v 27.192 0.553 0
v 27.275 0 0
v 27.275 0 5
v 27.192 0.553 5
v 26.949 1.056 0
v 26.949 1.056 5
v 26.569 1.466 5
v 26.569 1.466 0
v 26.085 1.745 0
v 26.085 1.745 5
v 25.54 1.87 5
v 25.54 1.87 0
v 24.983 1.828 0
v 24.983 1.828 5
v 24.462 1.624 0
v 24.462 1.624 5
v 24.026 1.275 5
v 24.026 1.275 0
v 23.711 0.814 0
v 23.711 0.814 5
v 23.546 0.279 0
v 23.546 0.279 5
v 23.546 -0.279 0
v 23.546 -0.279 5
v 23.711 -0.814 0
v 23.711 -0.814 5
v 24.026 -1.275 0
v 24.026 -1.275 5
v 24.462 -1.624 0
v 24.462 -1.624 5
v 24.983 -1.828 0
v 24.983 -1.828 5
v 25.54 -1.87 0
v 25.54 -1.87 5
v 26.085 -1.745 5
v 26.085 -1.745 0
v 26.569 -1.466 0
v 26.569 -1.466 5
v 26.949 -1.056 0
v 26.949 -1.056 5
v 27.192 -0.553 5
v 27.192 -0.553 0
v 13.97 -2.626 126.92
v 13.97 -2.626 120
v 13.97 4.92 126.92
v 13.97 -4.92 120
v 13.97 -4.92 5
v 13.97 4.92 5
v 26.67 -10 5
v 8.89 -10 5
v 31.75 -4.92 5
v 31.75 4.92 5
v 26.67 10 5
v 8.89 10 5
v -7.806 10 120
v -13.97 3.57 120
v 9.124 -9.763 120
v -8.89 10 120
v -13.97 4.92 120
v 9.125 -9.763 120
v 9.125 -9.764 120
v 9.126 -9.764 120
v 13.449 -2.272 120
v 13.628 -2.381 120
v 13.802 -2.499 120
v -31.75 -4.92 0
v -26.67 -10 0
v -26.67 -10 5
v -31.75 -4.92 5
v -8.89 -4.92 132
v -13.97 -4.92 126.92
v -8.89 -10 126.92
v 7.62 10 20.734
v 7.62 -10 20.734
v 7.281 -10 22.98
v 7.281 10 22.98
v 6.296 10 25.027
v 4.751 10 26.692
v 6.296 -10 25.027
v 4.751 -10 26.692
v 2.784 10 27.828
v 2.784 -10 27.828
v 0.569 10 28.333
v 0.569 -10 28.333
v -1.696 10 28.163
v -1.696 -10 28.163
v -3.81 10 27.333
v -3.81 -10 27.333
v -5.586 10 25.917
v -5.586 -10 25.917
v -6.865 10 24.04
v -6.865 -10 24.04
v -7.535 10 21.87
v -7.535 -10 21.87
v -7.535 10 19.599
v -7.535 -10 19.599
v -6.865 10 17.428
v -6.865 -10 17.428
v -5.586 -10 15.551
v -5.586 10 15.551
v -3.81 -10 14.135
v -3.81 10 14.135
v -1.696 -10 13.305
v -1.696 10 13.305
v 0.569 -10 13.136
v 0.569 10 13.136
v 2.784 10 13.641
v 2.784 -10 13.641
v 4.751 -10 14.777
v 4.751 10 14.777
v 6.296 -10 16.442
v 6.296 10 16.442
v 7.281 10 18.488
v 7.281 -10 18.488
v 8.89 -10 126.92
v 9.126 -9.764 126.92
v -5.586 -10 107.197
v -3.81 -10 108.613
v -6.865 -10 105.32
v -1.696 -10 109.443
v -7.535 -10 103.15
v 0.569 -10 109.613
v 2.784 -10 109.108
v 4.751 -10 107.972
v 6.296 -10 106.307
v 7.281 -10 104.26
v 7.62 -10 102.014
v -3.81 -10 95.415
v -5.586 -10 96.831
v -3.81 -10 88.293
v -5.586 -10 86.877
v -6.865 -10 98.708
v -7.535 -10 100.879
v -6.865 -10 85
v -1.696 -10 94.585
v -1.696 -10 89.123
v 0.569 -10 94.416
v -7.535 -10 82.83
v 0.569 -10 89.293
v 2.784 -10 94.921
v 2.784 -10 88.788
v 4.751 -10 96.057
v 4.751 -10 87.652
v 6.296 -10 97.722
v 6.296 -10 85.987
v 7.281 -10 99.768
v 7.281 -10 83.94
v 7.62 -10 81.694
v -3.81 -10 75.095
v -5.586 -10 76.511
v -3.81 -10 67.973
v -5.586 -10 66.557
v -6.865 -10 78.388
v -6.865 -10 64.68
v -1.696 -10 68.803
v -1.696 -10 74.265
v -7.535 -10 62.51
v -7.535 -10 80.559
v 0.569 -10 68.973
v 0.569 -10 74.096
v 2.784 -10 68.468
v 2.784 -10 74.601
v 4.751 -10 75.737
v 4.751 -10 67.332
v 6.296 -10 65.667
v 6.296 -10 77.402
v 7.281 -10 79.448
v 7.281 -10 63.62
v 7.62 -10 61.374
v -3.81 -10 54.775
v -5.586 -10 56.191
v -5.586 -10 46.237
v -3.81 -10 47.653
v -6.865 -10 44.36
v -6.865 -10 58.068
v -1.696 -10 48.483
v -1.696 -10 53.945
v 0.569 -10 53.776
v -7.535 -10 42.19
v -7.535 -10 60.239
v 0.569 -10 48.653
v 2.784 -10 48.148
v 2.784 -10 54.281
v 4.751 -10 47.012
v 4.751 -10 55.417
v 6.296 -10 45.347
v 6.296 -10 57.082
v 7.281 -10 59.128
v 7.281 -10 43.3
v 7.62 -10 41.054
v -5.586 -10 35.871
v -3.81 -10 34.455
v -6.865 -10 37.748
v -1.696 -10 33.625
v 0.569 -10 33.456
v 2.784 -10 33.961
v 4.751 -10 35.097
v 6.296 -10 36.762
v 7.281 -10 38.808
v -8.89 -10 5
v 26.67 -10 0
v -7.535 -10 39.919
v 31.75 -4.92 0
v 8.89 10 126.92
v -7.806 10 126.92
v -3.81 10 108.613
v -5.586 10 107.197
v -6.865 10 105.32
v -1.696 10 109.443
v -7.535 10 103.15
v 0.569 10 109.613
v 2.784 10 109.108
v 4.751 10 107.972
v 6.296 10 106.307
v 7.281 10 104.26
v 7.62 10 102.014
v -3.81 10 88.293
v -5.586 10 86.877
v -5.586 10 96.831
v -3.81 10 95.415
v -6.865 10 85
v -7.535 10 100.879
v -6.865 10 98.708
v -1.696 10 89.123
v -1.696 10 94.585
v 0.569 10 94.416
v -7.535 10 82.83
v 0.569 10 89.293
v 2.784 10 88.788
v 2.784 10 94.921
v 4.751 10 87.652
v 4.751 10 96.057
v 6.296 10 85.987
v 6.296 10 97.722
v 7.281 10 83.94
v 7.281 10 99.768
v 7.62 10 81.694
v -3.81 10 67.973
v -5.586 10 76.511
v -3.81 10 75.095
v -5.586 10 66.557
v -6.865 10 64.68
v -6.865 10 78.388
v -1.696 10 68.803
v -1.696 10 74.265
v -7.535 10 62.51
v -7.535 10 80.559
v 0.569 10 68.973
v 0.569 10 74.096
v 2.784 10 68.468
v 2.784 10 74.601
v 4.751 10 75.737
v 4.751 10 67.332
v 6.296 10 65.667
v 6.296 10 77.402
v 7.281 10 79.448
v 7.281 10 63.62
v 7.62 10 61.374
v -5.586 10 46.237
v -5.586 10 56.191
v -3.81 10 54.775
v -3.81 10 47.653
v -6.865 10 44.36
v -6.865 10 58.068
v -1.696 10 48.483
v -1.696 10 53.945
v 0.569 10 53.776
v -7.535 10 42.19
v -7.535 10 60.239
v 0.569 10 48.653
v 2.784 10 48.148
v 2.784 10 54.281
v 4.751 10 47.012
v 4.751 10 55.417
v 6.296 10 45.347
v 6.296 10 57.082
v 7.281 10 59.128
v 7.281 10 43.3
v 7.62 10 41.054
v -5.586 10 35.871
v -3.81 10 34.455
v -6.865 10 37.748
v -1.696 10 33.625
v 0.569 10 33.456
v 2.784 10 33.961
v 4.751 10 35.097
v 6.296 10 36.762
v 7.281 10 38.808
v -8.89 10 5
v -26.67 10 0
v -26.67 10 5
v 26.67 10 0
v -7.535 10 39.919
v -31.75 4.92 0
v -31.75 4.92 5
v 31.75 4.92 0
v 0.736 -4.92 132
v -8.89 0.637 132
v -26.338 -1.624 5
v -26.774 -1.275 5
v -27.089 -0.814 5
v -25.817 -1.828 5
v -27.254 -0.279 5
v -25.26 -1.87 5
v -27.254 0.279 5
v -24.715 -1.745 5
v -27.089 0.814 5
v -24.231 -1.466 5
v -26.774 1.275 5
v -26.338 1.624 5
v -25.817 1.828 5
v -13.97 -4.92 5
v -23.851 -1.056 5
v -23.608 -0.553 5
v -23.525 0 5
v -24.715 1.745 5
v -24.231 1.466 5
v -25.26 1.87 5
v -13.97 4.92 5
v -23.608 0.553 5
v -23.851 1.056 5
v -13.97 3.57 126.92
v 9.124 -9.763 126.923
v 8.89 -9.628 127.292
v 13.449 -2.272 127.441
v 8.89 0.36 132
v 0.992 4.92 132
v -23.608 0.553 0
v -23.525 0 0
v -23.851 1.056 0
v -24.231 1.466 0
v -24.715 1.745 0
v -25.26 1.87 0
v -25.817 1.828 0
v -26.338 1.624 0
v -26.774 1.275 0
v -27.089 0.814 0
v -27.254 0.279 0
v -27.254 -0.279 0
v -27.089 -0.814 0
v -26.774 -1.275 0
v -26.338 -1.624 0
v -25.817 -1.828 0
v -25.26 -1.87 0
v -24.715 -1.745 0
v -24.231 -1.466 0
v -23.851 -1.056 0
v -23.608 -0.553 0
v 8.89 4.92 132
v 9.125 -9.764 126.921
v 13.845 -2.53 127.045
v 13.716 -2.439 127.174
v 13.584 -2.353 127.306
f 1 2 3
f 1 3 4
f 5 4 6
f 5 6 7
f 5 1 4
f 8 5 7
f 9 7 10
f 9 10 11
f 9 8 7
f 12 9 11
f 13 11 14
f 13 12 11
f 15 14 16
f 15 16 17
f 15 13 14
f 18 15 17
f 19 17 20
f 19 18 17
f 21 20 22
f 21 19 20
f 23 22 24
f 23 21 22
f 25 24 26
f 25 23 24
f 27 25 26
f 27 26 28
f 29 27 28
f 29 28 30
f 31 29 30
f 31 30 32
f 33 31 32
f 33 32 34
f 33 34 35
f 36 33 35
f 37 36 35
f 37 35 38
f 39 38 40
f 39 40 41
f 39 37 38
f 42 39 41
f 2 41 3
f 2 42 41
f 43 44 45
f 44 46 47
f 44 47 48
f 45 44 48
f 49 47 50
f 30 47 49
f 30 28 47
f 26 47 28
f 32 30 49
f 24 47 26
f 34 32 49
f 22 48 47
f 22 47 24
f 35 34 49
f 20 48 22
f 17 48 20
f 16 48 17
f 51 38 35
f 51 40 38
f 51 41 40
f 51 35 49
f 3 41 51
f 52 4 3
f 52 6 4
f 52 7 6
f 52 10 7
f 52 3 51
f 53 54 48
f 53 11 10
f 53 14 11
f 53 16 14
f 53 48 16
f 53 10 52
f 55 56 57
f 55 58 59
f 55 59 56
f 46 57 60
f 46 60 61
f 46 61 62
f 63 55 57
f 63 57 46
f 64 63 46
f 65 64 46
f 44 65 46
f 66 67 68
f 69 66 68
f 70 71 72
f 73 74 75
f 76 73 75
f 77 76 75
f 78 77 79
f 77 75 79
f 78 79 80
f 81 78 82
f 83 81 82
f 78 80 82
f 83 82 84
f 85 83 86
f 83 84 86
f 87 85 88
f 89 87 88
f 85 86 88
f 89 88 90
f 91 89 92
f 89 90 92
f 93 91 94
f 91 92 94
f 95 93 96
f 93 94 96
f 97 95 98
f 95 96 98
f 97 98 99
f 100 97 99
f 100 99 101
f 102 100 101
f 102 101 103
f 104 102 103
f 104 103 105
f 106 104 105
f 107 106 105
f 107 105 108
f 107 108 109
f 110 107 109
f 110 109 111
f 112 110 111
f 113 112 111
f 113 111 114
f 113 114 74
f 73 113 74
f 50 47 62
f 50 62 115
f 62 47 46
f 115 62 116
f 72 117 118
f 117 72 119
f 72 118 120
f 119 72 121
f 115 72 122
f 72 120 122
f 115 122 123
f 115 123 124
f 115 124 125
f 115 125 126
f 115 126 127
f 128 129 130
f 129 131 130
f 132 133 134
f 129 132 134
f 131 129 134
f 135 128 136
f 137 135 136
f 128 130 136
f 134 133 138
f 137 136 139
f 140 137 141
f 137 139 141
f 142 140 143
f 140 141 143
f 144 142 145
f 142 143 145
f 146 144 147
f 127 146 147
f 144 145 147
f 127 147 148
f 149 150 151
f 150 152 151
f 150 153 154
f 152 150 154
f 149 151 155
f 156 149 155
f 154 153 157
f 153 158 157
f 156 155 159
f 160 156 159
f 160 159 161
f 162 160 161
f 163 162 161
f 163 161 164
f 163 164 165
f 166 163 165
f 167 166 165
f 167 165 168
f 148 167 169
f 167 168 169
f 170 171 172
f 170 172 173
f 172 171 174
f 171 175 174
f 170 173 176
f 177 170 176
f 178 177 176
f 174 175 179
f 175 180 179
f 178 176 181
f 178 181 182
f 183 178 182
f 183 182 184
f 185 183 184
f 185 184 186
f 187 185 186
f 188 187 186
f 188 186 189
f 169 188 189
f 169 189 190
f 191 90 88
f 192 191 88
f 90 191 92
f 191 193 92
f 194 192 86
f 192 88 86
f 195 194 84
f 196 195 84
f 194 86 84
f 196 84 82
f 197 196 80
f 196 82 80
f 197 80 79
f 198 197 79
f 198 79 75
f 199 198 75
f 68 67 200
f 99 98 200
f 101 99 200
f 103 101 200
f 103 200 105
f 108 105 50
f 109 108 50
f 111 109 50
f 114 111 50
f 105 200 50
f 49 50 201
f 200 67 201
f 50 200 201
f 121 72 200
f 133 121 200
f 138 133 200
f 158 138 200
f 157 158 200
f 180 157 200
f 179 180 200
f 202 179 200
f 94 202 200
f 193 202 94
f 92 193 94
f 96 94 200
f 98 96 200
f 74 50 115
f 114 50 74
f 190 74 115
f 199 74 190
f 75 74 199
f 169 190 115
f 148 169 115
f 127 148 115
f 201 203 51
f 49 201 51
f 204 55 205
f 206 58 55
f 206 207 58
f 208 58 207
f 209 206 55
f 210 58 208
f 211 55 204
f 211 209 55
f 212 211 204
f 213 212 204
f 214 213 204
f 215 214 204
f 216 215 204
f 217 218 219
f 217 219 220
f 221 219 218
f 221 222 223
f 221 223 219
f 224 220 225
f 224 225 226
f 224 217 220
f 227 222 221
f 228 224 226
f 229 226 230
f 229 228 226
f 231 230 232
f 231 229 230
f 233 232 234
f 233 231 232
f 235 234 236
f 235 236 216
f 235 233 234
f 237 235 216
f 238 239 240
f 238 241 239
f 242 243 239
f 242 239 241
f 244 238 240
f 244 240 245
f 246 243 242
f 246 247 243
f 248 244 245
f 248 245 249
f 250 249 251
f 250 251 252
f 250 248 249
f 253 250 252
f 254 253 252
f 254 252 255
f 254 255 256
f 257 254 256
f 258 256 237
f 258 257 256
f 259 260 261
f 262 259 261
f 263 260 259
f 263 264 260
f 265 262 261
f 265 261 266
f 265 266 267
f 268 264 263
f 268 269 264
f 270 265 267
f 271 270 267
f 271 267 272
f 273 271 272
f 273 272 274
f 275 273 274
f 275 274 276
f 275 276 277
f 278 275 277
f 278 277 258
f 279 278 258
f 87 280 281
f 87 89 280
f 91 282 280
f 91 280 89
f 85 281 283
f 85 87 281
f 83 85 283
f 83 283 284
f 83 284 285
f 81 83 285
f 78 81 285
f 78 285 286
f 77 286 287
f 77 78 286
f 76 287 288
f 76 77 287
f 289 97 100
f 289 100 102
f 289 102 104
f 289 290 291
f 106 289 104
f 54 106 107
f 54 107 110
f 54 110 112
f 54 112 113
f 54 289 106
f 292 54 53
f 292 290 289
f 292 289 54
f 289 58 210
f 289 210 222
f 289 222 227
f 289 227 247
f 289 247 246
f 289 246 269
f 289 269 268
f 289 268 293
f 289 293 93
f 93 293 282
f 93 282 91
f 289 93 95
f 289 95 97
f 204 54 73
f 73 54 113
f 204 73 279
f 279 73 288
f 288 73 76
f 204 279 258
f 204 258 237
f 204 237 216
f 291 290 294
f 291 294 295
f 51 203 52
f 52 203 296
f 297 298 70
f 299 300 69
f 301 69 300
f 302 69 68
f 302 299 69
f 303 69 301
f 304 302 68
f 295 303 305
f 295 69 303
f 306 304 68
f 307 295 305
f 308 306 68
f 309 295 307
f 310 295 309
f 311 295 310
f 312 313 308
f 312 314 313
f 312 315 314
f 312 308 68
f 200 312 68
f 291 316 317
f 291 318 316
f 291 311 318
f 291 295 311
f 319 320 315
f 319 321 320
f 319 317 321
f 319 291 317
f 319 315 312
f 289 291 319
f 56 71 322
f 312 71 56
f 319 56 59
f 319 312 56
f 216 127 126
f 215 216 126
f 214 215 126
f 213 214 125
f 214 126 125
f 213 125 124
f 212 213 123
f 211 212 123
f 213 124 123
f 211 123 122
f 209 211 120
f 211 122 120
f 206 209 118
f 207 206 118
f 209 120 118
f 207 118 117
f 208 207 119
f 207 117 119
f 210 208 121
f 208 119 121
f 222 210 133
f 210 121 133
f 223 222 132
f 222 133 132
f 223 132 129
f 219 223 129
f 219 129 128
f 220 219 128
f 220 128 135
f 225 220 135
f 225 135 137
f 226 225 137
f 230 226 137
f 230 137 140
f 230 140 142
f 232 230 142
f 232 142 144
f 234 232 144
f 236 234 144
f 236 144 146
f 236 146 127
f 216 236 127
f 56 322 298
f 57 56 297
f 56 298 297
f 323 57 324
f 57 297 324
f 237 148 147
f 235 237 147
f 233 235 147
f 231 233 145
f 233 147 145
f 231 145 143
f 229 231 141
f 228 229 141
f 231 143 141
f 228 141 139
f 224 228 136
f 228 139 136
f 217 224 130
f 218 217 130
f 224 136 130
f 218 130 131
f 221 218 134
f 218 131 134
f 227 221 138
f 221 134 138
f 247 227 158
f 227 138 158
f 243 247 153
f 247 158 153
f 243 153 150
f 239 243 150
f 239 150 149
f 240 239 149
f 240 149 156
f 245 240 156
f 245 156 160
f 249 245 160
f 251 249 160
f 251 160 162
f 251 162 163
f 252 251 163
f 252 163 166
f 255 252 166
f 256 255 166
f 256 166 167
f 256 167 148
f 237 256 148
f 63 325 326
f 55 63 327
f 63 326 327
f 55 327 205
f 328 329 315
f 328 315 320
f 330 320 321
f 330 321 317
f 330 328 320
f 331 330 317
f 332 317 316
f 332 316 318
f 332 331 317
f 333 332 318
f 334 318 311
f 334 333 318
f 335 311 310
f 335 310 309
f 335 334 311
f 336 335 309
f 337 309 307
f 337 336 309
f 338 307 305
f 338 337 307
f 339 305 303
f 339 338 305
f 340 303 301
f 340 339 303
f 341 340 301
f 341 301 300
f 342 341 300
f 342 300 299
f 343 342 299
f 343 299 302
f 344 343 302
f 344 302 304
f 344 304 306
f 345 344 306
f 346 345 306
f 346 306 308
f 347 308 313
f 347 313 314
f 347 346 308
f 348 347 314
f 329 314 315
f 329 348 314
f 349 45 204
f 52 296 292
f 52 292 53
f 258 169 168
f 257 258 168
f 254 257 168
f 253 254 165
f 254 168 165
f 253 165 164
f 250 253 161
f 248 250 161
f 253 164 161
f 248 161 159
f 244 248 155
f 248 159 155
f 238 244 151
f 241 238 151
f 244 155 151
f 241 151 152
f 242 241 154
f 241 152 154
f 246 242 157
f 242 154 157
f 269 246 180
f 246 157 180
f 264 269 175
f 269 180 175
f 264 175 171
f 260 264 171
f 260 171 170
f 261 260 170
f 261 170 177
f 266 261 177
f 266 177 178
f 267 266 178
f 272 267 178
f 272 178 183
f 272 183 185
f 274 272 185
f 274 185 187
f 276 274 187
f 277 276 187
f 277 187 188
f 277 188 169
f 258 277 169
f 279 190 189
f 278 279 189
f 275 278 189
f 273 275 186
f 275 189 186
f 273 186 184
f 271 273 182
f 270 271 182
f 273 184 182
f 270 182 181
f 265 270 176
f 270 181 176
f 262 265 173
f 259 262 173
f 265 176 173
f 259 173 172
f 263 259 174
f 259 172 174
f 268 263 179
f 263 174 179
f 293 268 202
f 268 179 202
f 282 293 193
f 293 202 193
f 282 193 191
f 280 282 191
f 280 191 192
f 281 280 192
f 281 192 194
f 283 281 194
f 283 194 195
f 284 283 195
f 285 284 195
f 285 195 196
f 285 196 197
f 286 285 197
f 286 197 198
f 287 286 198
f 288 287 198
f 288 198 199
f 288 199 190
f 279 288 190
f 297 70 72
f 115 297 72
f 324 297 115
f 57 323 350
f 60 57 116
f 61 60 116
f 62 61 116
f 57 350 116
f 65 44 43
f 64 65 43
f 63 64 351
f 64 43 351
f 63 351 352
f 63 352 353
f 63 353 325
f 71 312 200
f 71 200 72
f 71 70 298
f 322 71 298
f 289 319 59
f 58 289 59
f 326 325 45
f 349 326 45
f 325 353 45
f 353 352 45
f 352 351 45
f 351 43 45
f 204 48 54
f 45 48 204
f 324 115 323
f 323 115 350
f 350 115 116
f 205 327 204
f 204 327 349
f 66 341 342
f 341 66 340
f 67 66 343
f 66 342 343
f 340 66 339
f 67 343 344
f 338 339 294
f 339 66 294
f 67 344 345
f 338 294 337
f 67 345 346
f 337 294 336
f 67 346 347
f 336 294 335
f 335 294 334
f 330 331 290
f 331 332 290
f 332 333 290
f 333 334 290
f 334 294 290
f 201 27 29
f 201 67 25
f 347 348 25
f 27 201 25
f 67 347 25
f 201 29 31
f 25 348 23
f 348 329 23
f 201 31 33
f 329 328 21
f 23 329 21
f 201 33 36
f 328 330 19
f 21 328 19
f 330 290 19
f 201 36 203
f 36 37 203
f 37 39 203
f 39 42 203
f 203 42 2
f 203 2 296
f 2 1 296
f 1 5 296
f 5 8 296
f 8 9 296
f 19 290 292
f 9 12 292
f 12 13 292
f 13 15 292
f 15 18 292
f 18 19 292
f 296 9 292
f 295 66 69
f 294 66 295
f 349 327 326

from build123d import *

# Parameters (mm, degrees)
F0_W     = 63.5
F0_H     = 20
F0_R     = 1.875
F1_DEPTH = 5
F2_W     = 27.94
F2_H     = 20
F3_DEPTH = 127
F4_R     = 7.62
F5_DEPTH = 25.4
F6_SIZE  = 5.08
F8_DEPTH = 12


with BuildPart() as f1:
    # F0 (on Top) → F1 (new body)
    with BuildSketch(Plane.XY):
        Rectangle(F0_W, F0_H)
        with Locations((-25.4, 0)):
            Circle(F0_R, mode=Mode.SUBTRACT)
        with Locations((25.4, 0)):
            Circle(F0_R, mode=Mode.SUBTRACT)
    extrude(amount=F1_DEPTH)

    # F2 (on face) → F3 (join)
    with BuildSketch(Plane.XY.offset(5)):
        Rectangle(F2_W, F2_H)
    extrude(amount=F3_DEPTH)

    # F4 (on face) → F5 (cut)
    with BuildSketch(Plane.XZ.offset(10)):
        with Locations((0, 102.0142971116)):
            Circle(F4_R)
        with Locations((0, 81.6942971116)):
            Circle(F4_R)
        with Locations((0, 61.3742971116)):
            Circle(F4_R)
        with Locations((0, 41.0542971116)):
            Circle(F4_R)
        with Locations((0, 20.7342971116)):
            Circle(F4_R)
    extrude(amount=-F5_DEPTH, mode=Mode.SUBTRACT)

    # F6
    f6_edges = [f1.edges().sort_by_distance(p)[0] for p in [
        (-13.97, -10, 68.5),
        (13.97, -10, 68.5),
        (13.97, 10, 68.5),
        (-13.97, 10, 68.5),
        (-13.97, 0, 132),
        (0, -10, 132),
        (13.97, 0, 132),
        (0, 10, 132),
        (-31.75, -10, 2.5),
        (31.75, 10, 2.5),
        (31.75, -10, 2.5),
        (-31.75, 10, 2.5),
    ]]
    chamfer(f6_edges, length=F6_SIZE)

    # F7 (on face) → F8 (cut)
    with BuildSketch(Plane.XY.offset(132)):
        with BuildLine():
            ThreePointArc((9.1241109486, -9.7629955106), (15.03217082, -8.1799356392), (13.4491109486, -2.2718757679))
            Line((13.4491109486, -2.2718757679), (-10.0027512471, 11.2680631838))
            ThreePointArc((-10.0027512471, 11.2680631838), (-15.9108111184, 9.6850033125), (-14.3277512471, 3.7769434411))
            Line((-14.3277512471, 3.7769434411), (9.1241109486, -9.7629955106))
        make_face()
    extrude(amount=-F8_DEPTH, mode=Mode.SUBTRACT)


solid = f1.part
